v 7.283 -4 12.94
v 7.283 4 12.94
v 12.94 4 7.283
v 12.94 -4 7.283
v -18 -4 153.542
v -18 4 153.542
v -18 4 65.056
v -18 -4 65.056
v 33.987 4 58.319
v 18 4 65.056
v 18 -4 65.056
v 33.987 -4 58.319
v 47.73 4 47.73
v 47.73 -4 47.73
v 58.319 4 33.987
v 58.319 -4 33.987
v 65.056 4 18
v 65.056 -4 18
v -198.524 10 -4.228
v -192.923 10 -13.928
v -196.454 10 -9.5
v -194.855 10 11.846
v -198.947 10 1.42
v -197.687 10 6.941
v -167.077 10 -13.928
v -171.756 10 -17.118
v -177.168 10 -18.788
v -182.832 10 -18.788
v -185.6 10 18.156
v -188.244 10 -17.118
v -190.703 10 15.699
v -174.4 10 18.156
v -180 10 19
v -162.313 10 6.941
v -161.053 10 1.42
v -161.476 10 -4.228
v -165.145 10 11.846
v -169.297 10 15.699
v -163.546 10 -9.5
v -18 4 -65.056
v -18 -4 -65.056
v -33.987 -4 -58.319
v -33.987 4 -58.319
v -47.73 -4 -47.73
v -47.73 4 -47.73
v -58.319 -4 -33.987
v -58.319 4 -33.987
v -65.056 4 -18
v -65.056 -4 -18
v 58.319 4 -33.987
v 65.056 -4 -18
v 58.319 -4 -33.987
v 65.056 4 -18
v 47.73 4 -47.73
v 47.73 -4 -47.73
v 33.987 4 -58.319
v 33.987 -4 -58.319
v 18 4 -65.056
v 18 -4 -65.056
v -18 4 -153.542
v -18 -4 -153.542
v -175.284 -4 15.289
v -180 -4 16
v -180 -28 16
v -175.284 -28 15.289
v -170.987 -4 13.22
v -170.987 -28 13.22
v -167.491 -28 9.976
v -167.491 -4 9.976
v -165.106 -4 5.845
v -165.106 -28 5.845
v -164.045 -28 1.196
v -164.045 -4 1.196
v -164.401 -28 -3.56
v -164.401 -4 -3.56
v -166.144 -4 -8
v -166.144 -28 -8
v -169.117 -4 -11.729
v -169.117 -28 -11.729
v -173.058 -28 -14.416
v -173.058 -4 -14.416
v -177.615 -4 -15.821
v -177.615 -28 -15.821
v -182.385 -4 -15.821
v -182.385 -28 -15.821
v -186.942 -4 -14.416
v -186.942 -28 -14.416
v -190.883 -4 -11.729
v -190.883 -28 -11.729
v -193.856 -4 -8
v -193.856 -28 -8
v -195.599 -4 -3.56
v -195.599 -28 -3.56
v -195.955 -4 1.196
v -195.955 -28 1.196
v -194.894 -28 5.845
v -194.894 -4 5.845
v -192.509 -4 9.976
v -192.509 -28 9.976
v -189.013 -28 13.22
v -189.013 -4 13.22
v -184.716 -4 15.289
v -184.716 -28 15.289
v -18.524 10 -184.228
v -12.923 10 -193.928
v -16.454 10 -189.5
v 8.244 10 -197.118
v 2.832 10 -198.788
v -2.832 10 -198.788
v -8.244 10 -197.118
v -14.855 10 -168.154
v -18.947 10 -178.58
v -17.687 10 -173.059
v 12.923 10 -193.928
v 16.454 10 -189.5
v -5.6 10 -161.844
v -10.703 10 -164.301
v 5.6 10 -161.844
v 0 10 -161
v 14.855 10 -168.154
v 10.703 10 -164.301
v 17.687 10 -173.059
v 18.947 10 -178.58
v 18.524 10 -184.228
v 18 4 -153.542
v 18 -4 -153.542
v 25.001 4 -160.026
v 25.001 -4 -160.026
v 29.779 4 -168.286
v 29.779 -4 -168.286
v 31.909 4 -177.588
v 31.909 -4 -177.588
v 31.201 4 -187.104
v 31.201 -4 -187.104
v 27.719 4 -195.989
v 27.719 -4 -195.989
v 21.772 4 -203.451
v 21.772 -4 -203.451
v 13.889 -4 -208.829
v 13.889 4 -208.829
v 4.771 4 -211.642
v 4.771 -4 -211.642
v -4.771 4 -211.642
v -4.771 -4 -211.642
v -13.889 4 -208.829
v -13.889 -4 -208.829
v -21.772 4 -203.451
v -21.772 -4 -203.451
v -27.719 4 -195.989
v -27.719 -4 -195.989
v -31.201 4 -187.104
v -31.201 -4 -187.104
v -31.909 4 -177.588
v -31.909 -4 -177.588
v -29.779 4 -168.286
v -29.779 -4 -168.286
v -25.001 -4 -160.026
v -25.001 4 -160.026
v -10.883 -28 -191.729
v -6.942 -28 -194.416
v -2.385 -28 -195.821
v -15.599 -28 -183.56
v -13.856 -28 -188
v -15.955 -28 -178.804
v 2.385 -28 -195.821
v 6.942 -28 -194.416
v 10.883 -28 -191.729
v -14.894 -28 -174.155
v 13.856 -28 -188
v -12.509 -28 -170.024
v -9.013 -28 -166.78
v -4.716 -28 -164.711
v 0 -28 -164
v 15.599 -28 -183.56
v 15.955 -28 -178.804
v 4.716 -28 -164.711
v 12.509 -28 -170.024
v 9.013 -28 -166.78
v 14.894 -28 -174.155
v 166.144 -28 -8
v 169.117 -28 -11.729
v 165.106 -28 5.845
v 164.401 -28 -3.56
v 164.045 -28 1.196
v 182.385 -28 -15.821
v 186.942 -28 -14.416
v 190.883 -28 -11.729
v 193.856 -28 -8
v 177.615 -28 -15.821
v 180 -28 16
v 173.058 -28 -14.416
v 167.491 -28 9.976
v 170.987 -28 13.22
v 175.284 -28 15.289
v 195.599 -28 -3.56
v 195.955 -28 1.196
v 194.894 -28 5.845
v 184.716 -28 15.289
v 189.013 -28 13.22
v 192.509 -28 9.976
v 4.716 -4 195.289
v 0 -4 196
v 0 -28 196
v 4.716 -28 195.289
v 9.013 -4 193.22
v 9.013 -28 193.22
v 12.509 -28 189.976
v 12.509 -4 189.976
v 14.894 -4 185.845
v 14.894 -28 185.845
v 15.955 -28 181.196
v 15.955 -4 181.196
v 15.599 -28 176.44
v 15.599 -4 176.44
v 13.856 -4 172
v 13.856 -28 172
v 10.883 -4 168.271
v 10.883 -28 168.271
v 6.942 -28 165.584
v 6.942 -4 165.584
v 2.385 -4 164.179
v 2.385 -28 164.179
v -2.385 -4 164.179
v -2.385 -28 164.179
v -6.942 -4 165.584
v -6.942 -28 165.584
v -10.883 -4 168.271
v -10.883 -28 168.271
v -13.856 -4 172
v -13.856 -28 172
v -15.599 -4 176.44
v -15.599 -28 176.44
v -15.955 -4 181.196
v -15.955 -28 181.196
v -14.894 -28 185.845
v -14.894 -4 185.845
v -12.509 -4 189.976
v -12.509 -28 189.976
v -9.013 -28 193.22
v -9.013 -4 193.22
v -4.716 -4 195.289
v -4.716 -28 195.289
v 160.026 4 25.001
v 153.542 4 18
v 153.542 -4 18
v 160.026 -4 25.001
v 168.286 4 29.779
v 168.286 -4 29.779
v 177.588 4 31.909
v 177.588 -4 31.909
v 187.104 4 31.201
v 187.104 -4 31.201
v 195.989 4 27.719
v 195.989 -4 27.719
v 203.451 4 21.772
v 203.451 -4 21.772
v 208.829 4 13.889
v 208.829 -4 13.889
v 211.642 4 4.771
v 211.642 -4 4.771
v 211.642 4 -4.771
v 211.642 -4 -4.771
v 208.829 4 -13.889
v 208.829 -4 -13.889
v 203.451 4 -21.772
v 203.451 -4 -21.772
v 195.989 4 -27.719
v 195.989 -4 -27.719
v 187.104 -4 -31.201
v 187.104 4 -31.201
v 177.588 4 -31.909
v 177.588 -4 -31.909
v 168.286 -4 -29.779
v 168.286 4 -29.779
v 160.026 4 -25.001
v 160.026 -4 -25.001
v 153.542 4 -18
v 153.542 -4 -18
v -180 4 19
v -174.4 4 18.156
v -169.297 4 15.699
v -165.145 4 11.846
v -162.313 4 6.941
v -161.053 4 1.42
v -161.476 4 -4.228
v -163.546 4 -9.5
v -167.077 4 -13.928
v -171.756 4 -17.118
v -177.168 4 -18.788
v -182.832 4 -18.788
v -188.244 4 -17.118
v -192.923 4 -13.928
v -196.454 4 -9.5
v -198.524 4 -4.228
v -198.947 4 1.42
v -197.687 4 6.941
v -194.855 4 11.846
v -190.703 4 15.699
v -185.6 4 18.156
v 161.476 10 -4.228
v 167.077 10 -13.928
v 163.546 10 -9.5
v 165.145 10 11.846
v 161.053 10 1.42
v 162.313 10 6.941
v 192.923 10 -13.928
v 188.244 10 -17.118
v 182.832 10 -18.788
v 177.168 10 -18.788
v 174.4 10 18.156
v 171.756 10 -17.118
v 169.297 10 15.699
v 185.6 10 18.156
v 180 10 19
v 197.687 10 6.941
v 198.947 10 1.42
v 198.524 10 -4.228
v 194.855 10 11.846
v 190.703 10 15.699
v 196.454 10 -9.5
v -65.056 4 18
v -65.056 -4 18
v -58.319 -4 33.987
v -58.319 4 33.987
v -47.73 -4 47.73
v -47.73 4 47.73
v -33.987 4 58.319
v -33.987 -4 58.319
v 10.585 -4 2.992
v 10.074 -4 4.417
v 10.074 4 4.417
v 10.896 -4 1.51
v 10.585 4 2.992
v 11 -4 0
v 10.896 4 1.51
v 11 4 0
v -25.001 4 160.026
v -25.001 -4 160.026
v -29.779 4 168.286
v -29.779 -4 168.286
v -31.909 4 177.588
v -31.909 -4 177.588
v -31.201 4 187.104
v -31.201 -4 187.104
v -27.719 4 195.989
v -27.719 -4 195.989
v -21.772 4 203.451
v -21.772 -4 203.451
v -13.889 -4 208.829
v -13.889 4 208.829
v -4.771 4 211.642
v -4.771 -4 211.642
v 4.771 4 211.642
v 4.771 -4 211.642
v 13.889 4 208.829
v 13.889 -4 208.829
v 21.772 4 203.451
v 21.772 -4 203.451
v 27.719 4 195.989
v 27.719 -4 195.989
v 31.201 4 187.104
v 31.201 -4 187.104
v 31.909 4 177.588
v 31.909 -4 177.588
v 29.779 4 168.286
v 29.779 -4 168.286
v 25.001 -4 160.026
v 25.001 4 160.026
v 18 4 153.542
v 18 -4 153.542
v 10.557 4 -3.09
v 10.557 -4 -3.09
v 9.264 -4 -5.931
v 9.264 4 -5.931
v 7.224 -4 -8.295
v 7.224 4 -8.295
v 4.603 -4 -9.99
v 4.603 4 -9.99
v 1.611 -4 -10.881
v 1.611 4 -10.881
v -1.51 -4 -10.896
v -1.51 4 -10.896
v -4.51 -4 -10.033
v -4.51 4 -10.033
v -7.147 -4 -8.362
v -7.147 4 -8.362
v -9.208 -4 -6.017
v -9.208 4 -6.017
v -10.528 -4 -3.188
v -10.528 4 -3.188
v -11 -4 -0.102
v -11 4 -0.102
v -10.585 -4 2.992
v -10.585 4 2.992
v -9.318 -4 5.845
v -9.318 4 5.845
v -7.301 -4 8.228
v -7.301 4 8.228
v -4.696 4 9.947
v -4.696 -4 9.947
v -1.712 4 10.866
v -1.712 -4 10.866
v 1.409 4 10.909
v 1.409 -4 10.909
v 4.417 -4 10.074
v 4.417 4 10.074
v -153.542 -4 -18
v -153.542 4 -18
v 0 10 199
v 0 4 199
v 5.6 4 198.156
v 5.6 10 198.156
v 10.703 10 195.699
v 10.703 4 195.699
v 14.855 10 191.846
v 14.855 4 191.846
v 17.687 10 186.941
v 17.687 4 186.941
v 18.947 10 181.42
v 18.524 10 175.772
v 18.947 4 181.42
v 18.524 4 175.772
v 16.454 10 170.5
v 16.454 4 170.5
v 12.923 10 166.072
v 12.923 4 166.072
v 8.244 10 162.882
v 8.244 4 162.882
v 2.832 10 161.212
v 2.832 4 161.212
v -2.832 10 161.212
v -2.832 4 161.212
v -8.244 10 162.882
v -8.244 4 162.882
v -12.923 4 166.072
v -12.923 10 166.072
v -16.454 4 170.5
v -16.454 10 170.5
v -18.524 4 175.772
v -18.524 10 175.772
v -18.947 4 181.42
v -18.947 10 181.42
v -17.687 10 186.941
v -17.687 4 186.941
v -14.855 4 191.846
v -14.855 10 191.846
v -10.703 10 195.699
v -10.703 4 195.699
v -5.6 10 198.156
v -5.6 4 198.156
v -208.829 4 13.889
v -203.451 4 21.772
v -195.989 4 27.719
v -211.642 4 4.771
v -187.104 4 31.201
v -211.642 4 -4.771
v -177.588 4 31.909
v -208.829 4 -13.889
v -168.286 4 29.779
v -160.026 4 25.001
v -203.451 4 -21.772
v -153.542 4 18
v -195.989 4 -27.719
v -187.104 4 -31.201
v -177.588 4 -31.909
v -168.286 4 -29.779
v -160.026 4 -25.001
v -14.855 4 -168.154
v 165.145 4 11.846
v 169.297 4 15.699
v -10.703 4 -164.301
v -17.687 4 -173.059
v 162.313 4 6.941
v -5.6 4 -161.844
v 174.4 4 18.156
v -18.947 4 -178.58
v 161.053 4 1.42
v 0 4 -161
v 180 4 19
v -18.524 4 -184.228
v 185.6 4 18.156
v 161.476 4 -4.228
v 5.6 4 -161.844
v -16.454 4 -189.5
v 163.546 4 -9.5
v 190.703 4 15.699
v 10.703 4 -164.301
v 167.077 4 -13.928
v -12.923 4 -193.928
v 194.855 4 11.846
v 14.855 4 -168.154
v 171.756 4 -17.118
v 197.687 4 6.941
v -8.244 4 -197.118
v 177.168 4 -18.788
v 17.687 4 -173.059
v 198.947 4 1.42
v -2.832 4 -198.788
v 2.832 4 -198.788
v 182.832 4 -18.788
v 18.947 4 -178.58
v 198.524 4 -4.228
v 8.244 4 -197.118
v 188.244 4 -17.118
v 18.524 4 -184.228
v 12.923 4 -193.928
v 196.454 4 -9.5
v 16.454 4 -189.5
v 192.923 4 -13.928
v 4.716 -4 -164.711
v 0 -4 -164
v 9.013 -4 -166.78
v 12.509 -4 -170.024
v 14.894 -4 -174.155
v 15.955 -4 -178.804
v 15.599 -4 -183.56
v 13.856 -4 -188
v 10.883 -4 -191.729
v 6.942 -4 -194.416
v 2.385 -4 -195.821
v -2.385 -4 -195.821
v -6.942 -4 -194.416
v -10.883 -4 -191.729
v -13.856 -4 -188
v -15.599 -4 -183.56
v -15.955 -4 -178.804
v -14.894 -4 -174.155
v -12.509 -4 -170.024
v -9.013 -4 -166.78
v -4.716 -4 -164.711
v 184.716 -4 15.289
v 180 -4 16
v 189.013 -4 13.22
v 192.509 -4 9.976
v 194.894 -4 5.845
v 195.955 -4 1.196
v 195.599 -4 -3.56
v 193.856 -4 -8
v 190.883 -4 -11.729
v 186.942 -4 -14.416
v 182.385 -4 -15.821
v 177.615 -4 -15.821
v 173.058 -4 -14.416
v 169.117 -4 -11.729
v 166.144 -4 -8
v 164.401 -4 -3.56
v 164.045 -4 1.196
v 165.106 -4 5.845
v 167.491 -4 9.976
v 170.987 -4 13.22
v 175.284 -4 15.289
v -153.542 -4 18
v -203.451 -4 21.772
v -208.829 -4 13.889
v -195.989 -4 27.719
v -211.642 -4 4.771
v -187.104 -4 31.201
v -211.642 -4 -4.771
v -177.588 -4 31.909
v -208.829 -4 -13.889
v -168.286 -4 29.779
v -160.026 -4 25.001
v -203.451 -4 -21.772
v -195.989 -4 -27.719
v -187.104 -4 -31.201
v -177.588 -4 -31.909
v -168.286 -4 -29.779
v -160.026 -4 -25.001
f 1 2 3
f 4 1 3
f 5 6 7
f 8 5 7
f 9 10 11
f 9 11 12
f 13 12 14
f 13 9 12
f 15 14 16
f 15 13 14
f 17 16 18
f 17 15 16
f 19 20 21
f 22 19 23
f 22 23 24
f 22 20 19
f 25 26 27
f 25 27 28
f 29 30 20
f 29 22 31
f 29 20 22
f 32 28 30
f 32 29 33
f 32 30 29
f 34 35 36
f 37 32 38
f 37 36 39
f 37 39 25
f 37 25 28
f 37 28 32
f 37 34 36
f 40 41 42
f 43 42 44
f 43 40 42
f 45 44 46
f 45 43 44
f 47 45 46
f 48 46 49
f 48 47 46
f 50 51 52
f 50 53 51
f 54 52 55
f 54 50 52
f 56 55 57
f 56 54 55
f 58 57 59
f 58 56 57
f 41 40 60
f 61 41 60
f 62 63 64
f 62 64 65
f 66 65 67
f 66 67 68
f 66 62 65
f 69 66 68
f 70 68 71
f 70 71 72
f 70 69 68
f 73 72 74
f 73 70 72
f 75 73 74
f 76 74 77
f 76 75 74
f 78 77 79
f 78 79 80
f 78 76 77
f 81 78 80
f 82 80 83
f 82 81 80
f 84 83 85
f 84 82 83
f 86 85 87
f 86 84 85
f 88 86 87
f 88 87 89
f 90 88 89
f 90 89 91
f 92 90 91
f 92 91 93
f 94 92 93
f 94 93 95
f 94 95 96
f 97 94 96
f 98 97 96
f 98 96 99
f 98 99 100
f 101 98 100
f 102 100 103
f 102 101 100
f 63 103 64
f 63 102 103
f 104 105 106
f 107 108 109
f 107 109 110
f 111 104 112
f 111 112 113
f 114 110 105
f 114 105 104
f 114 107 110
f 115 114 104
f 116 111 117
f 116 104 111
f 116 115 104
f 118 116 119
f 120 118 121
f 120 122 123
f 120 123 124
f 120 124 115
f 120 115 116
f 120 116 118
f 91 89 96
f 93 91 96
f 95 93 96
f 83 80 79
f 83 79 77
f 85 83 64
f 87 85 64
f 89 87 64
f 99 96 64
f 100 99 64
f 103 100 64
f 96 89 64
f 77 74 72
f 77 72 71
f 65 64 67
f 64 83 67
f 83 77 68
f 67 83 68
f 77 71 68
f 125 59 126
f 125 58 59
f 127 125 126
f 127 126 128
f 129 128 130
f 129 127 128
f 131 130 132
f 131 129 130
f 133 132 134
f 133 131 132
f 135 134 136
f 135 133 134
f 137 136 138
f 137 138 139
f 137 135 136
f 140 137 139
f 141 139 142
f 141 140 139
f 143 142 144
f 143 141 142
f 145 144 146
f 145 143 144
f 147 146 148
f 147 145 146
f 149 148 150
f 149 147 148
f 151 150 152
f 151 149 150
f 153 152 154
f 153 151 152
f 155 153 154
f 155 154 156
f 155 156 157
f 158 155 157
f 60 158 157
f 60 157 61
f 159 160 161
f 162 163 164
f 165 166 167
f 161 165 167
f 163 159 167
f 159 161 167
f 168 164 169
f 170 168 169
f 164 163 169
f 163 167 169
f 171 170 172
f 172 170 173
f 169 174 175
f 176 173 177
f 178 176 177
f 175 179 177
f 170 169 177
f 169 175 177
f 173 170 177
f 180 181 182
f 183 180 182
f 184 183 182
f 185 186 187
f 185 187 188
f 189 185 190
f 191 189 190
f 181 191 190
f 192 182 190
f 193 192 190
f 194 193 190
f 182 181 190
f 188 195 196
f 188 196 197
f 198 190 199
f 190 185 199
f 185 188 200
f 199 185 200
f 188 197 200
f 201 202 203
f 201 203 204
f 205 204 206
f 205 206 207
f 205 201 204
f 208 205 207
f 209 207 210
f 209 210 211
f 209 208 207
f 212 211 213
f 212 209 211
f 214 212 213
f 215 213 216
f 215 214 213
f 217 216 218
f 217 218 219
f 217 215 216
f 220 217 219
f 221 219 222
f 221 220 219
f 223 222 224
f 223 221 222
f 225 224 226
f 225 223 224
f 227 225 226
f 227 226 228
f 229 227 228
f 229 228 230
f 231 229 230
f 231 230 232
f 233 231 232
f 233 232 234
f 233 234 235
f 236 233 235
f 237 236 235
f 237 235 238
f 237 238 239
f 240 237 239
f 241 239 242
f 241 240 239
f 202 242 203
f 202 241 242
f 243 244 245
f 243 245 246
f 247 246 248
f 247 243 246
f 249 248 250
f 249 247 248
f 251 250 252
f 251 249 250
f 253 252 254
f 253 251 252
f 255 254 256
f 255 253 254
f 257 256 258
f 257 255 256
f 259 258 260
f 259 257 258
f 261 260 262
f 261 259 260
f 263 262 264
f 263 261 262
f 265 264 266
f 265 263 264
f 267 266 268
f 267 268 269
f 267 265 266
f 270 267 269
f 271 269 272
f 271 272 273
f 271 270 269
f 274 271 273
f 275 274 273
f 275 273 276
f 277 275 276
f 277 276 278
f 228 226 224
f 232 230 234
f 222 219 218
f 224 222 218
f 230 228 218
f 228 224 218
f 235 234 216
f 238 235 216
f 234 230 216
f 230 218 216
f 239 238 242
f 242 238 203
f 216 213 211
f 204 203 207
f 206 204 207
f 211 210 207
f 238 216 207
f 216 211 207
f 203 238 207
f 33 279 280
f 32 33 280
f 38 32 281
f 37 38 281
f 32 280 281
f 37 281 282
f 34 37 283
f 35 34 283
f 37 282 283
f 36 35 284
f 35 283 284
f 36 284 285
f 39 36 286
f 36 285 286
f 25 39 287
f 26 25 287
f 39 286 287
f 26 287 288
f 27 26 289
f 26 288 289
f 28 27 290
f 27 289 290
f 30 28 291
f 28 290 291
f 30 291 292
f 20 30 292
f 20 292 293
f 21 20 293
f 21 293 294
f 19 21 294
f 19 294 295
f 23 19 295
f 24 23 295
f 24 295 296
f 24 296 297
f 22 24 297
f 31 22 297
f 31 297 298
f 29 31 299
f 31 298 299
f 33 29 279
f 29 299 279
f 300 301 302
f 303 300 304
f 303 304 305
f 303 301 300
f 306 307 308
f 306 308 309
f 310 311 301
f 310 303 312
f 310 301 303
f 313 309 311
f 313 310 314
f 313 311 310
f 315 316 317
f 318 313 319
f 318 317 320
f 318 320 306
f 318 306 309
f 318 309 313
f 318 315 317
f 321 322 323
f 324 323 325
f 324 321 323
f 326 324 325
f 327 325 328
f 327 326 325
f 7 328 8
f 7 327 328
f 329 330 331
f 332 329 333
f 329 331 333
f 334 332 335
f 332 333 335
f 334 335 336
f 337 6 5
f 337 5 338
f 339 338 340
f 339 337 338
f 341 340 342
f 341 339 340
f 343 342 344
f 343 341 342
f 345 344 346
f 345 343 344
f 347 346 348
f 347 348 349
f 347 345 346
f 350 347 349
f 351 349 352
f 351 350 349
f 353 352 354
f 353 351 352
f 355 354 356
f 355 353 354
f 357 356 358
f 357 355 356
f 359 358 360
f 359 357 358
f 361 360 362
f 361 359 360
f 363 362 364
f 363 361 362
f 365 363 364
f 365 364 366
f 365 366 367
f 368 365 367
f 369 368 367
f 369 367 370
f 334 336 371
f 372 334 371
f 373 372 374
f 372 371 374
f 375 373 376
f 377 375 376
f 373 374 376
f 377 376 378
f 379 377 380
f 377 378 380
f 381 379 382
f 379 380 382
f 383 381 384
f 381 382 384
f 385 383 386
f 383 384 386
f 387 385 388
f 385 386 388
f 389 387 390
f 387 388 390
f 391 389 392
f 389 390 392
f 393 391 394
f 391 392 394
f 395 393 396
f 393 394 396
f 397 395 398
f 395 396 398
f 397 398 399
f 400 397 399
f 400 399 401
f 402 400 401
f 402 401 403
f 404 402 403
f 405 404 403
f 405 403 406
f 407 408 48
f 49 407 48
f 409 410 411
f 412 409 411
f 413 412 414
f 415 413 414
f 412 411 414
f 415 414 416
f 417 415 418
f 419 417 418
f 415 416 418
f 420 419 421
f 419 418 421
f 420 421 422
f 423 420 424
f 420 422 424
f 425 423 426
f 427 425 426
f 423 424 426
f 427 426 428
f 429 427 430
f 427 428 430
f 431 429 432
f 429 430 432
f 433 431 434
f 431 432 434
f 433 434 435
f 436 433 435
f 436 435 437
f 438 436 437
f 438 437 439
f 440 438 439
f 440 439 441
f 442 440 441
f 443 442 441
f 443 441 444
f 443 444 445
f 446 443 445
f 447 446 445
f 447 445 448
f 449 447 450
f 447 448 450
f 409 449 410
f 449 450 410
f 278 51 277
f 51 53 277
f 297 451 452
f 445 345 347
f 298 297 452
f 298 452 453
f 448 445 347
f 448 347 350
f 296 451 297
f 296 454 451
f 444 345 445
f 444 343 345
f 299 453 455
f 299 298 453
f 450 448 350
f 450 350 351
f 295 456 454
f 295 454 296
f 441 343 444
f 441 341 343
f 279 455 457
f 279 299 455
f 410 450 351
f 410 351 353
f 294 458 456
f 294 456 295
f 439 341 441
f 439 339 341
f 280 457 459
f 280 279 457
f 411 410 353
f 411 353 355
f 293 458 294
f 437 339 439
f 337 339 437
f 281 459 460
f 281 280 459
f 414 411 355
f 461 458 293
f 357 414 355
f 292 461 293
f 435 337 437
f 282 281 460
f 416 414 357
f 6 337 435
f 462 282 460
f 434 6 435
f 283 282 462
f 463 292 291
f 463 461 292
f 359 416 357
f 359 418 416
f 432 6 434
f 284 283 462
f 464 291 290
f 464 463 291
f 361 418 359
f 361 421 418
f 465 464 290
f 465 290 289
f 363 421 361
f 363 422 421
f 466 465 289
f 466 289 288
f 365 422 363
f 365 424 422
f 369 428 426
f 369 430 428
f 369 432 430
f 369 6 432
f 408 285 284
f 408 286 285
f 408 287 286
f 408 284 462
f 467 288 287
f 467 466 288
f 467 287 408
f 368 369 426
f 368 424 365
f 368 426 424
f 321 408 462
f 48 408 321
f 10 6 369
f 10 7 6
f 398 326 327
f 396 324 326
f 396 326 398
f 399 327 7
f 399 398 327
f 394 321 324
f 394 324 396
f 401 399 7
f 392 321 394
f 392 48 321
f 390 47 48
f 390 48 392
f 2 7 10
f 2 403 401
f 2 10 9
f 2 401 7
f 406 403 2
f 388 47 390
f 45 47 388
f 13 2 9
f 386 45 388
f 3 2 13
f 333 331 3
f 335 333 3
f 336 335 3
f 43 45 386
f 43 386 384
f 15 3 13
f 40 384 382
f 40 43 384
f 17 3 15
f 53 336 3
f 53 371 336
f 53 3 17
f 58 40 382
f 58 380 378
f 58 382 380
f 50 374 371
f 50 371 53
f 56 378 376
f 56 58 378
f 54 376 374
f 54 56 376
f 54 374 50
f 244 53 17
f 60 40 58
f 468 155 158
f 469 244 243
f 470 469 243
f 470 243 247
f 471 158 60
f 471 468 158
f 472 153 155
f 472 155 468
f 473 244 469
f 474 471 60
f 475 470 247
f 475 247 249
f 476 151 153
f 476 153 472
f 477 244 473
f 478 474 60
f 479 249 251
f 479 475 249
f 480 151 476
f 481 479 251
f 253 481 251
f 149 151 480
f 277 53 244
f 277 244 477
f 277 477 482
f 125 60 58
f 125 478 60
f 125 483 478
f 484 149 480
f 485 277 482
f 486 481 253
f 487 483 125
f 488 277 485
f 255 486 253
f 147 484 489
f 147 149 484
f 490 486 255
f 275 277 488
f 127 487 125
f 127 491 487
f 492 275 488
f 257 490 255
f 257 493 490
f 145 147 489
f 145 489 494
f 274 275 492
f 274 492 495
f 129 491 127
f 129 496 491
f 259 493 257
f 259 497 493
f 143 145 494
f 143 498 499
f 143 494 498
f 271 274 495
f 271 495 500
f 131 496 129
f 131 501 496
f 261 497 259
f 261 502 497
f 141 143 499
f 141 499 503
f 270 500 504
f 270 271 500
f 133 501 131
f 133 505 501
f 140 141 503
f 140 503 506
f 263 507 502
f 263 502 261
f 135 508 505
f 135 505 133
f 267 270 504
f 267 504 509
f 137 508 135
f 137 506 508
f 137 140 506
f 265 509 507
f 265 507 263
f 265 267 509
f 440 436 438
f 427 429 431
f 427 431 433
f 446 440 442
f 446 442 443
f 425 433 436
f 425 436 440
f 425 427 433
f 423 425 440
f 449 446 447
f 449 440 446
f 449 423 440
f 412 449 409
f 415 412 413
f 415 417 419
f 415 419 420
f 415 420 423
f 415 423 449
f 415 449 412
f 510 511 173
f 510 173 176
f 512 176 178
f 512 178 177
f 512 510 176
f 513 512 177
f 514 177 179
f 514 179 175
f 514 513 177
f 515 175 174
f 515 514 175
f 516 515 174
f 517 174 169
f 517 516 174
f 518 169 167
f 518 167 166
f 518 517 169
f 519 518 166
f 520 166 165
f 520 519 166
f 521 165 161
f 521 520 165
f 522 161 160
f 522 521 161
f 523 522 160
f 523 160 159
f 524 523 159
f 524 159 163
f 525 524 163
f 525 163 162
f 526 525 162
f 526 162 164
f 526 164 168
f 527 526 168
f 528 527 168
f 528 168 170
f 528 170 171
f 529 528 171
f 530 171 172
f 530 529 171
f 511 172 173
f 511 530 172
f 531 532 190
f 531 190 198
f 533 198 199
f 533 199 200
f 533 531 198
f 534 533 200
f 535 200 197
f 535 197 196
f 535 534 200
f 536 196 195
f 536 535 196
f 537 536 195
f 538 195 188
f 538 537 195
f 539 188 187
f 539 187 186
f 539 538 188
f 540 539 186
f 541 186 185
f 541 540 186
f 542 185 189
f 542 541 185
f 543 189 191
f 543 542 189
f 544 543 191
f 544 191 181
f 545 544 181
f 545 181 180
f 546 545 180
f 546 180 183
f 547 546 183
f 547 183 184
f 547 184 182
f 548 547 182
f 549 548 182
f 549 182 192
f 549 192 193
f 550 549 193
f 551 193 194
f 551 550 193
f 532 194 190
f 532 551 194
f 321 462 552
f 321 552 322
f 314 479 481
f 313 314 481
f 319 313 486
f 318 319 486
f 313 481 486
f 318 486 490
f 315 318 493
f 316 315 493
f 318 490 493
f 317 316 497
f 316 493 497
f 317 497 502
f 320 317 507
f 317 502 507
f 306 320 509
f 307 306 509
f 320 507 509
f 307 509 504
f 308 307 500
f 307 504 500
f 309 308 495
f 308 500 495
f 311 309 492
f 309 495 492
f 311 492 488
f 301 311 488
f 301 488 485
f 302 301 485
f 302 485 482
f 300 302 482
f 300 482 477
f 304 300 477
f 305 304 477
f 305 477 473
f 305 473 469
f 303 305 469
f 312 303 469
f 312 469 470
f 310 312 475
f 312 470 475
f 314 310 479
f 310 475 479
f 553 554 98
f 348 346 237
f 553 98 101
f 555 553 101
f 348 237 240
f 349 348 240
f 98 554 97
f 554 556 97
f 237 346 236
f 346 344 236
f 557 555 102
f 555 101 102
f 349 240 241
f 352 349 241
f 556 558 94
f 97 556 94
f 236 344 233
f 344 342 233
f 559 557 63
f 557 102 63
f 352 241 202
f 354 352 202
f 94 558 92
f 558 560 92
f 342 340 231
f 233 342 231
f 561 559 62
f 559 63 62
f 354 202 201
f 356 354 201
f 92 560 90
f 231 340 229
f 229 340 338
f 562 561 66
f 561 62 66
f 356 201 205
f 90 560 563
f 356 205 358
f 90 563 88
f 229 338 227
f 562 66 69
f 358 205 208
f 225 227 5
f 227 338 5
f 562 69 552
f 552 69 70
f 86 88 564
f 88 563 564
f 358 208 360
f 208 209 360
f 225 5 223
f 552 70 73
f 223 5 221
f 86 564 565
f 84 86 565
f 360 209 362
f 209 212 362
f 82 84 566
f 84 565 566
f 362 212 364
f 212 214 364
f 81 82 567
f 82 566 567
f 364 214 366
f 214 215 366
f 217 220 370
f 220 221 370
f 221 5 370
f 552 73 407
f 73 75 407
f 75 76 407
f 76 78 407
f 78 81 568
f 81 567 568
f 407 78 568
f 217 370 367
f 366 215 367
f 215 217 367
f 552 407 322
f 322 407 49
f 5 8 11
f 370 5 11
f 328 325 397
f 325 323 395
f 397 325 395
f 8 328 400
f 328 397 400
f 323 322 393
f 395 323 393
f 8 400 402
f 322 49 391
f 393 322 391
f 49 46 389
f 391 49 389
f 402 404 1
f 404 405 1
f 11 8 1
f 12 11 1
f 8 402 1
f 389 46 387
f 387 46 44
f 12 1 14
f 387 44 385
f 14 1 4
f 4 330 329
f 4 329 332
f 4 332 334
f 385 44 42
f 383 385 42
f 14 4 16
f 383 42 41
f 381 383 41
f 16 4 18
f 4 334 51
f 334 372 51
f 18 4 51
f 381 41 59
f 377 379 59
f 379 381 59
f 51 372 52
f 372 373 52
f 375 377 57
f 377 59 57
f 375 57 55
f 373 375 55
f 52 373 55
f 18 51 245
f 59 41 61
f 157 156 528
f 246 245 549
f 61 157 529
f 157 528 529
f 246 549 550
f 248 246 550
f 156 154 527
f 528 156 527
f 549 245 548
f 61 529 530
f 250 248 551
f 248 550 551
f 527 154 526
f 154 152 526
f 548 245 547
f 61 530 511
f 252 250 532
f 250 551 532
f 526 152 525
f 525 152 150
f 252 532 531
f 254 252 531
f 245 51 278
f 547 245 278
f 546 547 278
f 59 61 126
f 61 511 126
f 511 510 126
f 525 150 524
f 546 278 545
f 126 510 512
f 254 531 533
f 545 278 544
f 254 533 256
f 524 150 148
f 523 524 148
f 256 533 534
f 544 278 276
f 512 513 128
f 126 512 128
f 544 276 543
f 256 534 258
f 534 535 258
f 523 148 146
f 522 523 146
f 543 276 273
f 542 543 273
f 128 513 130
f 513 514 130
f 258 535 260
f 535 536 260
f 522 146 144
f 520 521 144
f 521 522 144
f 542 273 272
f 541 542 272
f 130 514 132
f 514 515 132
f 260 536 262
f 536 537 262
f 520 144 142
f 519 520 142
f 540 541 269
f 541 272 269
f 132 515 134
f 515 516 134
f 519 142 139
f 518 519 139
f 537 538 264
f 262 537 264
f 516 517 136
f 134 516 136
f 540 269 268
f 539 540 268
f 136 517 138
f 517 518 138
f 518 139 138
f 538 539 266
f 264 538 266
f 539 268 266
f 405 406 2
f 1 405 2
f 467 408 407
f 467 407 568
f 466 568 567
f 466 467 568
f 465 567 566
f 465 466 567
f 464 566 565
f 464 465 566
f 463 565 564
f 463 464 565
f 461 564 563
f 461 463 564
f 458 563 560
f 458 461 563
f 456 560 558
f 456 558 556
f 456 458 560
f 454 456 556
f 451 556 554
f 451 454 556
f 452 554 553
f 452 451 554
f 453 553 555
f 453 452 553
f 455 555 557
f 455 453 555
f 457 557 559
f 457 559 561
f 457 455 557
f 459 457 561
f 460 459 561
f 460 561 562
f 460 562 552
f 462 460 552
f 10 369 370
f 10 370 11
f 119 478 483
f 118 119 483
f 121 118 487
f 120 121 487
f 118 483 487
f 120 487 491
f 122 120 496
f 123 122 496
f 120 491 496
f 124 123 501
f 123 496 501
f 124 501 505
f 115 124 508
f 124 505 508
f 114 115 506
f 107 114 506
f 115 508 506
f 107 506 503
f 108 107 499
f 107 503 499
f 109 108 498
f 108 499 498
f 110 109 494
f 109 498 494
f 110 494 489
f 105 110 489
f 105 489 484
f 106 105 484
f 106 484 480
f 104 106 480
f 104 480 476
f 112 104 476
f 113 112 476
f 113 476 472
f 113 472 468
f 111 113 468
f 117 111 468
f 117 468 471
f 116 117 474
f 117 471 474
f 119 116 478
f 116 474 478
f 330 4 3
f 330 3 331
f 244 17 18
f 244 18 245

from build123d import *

# Parameters (mm, degrees)
SKETCH1_R           = 32
SKETCH1_R_2         = 67.5
SKETCH1_W           = 36
SKETCH1_H           = 360
SKETCH1_W_2         = 360
SKETCH1_H_2         = 36
BOSS_EXTRUDE1_DEPTH = 4
SKETCH2_R           = 16
BOSS_EXTRUDE2_DEPTH = 24
SKETCH3_R           = 19
BOSS_EXTRUDE3_DEPTH = 6
CUT_EXTRUDE1_DEPTH  = 8


with BuildPart() as part:
    # Sketch1 → Boss-Extrude1 (new, symmetric)
    with BuildSketch(Plane(origin=(0, 0, 0), x_dir=(1, 0, 0), z_dir=(0, 1, 0))):
        with Locations((0, 180)):
            Circle(SKETCH1_R)
        with Locations((180, 0)):
            Circle(SKETCH1_R)
        with Locations((0, -180)):
            Circle(SKETCH1_R)
        with Locations((-180, 0)):
            Circle(SKETCH1_R)
        Circle(SKETCH1_R_2)
        Rectangle(SKETCH1_W, SKETCH1_H)
        Rectangle(SKETCH1_W_2, SKETCH1_H_2)
    extrude(amount=BOSS_EXTRUDE1_DEPTH, both=True)

    # Sketch2 → Boss-Extrude2 (add)
    with BuildSketch(Plane(origin=(0, -4, 0), x_dir=(1, 0, 0), z_dir=(0, 1, 0))):
        with Locations(Location((-180, 0, 0), (0, 0, 270))):
            Circle(SKETCH2_R)
        with Locations(Location((0, -180, 0), (0, 0, 270))):
            Circle(SKETCH2_R)
        with Locations(Location((180, 0, 0), (0, 0, 270))):
            Circle(SKETCH2_R)
        with Locations(Location((0, 180, 0), (0, 0, 270))):
            Circle(SKETCH2_R)
    extrude(amount=-BOSS_EXTRUDE2_DEPTH)

    # Sketch3 → Boss-Extrude3 (add)
    with BuildSketch(Plane(origin=(0, 4, 0), x_dir=(1, 0, 0), z_dir=(0, 1, 0))):
        with Locations(Location((-180, 0, 0), (0, 0, 270))):
            Circle(SKETCH3_R)
        with Locations(Location((0, 180, 0), (0, 0, 270))):
            Circle(SKETCH3_R)
        with Locations(Location((180, 0, 0), (0, 0, 270))):
            Circle(SKETCH3_R)
        with Locations(Location((0, -180, 0), (0, 0, 270))):
            Circle(SKETCH3_R)
    extrude(amount=BOSS_EXTRUDE3_DEPTH)

    # Sketch4 → Cut-Extrude1 (cut)
    with BuildSketch(Plane(origin=(0, 4, 0), x_dir=(1, 0, 0), z_dir=(0, 1, 0))):
        with BuildLine():
            ThreePointArc((11, 0), (-9.208416632, 6.017064329), (4.417261248, -10.074115498))
            Line((4.417261248, -10.074115498), (10.074115498, -4.417261248))
            ThreePointArc((10.074115498, -4.417261248), (10.766040834, -2.256626855), (11, 0))
        make_face()
        with BuildLine():
            Line((10.074115498, -4.417261248), (4.417261248, -10.074115498))
            ThreePointArc((4.417261248, -10.074115498), (7.778174593, -7.778174593), (10.074115498, -4.417261248))
        make_face()
        with BuildLine():
            ThreePointArc((10.074115498, -4.417261248), (7.778174593, -7.778174593), (4.417261248, -10.074115498))
            Line((4.417261248, -10.074115498), (7.283199846, -12.940054096))
            Line((7.283199846, -12.940054096), (12.940054096, -7.283199846))
            Line((12.940054096, -7.283199846), (10.074115498, -4.417261248))
        make_face()
    extrude(amount=-CUT_EXTRUDE1_DEPTH, mode=Mode.SUBTRACT)


solid = part.part
